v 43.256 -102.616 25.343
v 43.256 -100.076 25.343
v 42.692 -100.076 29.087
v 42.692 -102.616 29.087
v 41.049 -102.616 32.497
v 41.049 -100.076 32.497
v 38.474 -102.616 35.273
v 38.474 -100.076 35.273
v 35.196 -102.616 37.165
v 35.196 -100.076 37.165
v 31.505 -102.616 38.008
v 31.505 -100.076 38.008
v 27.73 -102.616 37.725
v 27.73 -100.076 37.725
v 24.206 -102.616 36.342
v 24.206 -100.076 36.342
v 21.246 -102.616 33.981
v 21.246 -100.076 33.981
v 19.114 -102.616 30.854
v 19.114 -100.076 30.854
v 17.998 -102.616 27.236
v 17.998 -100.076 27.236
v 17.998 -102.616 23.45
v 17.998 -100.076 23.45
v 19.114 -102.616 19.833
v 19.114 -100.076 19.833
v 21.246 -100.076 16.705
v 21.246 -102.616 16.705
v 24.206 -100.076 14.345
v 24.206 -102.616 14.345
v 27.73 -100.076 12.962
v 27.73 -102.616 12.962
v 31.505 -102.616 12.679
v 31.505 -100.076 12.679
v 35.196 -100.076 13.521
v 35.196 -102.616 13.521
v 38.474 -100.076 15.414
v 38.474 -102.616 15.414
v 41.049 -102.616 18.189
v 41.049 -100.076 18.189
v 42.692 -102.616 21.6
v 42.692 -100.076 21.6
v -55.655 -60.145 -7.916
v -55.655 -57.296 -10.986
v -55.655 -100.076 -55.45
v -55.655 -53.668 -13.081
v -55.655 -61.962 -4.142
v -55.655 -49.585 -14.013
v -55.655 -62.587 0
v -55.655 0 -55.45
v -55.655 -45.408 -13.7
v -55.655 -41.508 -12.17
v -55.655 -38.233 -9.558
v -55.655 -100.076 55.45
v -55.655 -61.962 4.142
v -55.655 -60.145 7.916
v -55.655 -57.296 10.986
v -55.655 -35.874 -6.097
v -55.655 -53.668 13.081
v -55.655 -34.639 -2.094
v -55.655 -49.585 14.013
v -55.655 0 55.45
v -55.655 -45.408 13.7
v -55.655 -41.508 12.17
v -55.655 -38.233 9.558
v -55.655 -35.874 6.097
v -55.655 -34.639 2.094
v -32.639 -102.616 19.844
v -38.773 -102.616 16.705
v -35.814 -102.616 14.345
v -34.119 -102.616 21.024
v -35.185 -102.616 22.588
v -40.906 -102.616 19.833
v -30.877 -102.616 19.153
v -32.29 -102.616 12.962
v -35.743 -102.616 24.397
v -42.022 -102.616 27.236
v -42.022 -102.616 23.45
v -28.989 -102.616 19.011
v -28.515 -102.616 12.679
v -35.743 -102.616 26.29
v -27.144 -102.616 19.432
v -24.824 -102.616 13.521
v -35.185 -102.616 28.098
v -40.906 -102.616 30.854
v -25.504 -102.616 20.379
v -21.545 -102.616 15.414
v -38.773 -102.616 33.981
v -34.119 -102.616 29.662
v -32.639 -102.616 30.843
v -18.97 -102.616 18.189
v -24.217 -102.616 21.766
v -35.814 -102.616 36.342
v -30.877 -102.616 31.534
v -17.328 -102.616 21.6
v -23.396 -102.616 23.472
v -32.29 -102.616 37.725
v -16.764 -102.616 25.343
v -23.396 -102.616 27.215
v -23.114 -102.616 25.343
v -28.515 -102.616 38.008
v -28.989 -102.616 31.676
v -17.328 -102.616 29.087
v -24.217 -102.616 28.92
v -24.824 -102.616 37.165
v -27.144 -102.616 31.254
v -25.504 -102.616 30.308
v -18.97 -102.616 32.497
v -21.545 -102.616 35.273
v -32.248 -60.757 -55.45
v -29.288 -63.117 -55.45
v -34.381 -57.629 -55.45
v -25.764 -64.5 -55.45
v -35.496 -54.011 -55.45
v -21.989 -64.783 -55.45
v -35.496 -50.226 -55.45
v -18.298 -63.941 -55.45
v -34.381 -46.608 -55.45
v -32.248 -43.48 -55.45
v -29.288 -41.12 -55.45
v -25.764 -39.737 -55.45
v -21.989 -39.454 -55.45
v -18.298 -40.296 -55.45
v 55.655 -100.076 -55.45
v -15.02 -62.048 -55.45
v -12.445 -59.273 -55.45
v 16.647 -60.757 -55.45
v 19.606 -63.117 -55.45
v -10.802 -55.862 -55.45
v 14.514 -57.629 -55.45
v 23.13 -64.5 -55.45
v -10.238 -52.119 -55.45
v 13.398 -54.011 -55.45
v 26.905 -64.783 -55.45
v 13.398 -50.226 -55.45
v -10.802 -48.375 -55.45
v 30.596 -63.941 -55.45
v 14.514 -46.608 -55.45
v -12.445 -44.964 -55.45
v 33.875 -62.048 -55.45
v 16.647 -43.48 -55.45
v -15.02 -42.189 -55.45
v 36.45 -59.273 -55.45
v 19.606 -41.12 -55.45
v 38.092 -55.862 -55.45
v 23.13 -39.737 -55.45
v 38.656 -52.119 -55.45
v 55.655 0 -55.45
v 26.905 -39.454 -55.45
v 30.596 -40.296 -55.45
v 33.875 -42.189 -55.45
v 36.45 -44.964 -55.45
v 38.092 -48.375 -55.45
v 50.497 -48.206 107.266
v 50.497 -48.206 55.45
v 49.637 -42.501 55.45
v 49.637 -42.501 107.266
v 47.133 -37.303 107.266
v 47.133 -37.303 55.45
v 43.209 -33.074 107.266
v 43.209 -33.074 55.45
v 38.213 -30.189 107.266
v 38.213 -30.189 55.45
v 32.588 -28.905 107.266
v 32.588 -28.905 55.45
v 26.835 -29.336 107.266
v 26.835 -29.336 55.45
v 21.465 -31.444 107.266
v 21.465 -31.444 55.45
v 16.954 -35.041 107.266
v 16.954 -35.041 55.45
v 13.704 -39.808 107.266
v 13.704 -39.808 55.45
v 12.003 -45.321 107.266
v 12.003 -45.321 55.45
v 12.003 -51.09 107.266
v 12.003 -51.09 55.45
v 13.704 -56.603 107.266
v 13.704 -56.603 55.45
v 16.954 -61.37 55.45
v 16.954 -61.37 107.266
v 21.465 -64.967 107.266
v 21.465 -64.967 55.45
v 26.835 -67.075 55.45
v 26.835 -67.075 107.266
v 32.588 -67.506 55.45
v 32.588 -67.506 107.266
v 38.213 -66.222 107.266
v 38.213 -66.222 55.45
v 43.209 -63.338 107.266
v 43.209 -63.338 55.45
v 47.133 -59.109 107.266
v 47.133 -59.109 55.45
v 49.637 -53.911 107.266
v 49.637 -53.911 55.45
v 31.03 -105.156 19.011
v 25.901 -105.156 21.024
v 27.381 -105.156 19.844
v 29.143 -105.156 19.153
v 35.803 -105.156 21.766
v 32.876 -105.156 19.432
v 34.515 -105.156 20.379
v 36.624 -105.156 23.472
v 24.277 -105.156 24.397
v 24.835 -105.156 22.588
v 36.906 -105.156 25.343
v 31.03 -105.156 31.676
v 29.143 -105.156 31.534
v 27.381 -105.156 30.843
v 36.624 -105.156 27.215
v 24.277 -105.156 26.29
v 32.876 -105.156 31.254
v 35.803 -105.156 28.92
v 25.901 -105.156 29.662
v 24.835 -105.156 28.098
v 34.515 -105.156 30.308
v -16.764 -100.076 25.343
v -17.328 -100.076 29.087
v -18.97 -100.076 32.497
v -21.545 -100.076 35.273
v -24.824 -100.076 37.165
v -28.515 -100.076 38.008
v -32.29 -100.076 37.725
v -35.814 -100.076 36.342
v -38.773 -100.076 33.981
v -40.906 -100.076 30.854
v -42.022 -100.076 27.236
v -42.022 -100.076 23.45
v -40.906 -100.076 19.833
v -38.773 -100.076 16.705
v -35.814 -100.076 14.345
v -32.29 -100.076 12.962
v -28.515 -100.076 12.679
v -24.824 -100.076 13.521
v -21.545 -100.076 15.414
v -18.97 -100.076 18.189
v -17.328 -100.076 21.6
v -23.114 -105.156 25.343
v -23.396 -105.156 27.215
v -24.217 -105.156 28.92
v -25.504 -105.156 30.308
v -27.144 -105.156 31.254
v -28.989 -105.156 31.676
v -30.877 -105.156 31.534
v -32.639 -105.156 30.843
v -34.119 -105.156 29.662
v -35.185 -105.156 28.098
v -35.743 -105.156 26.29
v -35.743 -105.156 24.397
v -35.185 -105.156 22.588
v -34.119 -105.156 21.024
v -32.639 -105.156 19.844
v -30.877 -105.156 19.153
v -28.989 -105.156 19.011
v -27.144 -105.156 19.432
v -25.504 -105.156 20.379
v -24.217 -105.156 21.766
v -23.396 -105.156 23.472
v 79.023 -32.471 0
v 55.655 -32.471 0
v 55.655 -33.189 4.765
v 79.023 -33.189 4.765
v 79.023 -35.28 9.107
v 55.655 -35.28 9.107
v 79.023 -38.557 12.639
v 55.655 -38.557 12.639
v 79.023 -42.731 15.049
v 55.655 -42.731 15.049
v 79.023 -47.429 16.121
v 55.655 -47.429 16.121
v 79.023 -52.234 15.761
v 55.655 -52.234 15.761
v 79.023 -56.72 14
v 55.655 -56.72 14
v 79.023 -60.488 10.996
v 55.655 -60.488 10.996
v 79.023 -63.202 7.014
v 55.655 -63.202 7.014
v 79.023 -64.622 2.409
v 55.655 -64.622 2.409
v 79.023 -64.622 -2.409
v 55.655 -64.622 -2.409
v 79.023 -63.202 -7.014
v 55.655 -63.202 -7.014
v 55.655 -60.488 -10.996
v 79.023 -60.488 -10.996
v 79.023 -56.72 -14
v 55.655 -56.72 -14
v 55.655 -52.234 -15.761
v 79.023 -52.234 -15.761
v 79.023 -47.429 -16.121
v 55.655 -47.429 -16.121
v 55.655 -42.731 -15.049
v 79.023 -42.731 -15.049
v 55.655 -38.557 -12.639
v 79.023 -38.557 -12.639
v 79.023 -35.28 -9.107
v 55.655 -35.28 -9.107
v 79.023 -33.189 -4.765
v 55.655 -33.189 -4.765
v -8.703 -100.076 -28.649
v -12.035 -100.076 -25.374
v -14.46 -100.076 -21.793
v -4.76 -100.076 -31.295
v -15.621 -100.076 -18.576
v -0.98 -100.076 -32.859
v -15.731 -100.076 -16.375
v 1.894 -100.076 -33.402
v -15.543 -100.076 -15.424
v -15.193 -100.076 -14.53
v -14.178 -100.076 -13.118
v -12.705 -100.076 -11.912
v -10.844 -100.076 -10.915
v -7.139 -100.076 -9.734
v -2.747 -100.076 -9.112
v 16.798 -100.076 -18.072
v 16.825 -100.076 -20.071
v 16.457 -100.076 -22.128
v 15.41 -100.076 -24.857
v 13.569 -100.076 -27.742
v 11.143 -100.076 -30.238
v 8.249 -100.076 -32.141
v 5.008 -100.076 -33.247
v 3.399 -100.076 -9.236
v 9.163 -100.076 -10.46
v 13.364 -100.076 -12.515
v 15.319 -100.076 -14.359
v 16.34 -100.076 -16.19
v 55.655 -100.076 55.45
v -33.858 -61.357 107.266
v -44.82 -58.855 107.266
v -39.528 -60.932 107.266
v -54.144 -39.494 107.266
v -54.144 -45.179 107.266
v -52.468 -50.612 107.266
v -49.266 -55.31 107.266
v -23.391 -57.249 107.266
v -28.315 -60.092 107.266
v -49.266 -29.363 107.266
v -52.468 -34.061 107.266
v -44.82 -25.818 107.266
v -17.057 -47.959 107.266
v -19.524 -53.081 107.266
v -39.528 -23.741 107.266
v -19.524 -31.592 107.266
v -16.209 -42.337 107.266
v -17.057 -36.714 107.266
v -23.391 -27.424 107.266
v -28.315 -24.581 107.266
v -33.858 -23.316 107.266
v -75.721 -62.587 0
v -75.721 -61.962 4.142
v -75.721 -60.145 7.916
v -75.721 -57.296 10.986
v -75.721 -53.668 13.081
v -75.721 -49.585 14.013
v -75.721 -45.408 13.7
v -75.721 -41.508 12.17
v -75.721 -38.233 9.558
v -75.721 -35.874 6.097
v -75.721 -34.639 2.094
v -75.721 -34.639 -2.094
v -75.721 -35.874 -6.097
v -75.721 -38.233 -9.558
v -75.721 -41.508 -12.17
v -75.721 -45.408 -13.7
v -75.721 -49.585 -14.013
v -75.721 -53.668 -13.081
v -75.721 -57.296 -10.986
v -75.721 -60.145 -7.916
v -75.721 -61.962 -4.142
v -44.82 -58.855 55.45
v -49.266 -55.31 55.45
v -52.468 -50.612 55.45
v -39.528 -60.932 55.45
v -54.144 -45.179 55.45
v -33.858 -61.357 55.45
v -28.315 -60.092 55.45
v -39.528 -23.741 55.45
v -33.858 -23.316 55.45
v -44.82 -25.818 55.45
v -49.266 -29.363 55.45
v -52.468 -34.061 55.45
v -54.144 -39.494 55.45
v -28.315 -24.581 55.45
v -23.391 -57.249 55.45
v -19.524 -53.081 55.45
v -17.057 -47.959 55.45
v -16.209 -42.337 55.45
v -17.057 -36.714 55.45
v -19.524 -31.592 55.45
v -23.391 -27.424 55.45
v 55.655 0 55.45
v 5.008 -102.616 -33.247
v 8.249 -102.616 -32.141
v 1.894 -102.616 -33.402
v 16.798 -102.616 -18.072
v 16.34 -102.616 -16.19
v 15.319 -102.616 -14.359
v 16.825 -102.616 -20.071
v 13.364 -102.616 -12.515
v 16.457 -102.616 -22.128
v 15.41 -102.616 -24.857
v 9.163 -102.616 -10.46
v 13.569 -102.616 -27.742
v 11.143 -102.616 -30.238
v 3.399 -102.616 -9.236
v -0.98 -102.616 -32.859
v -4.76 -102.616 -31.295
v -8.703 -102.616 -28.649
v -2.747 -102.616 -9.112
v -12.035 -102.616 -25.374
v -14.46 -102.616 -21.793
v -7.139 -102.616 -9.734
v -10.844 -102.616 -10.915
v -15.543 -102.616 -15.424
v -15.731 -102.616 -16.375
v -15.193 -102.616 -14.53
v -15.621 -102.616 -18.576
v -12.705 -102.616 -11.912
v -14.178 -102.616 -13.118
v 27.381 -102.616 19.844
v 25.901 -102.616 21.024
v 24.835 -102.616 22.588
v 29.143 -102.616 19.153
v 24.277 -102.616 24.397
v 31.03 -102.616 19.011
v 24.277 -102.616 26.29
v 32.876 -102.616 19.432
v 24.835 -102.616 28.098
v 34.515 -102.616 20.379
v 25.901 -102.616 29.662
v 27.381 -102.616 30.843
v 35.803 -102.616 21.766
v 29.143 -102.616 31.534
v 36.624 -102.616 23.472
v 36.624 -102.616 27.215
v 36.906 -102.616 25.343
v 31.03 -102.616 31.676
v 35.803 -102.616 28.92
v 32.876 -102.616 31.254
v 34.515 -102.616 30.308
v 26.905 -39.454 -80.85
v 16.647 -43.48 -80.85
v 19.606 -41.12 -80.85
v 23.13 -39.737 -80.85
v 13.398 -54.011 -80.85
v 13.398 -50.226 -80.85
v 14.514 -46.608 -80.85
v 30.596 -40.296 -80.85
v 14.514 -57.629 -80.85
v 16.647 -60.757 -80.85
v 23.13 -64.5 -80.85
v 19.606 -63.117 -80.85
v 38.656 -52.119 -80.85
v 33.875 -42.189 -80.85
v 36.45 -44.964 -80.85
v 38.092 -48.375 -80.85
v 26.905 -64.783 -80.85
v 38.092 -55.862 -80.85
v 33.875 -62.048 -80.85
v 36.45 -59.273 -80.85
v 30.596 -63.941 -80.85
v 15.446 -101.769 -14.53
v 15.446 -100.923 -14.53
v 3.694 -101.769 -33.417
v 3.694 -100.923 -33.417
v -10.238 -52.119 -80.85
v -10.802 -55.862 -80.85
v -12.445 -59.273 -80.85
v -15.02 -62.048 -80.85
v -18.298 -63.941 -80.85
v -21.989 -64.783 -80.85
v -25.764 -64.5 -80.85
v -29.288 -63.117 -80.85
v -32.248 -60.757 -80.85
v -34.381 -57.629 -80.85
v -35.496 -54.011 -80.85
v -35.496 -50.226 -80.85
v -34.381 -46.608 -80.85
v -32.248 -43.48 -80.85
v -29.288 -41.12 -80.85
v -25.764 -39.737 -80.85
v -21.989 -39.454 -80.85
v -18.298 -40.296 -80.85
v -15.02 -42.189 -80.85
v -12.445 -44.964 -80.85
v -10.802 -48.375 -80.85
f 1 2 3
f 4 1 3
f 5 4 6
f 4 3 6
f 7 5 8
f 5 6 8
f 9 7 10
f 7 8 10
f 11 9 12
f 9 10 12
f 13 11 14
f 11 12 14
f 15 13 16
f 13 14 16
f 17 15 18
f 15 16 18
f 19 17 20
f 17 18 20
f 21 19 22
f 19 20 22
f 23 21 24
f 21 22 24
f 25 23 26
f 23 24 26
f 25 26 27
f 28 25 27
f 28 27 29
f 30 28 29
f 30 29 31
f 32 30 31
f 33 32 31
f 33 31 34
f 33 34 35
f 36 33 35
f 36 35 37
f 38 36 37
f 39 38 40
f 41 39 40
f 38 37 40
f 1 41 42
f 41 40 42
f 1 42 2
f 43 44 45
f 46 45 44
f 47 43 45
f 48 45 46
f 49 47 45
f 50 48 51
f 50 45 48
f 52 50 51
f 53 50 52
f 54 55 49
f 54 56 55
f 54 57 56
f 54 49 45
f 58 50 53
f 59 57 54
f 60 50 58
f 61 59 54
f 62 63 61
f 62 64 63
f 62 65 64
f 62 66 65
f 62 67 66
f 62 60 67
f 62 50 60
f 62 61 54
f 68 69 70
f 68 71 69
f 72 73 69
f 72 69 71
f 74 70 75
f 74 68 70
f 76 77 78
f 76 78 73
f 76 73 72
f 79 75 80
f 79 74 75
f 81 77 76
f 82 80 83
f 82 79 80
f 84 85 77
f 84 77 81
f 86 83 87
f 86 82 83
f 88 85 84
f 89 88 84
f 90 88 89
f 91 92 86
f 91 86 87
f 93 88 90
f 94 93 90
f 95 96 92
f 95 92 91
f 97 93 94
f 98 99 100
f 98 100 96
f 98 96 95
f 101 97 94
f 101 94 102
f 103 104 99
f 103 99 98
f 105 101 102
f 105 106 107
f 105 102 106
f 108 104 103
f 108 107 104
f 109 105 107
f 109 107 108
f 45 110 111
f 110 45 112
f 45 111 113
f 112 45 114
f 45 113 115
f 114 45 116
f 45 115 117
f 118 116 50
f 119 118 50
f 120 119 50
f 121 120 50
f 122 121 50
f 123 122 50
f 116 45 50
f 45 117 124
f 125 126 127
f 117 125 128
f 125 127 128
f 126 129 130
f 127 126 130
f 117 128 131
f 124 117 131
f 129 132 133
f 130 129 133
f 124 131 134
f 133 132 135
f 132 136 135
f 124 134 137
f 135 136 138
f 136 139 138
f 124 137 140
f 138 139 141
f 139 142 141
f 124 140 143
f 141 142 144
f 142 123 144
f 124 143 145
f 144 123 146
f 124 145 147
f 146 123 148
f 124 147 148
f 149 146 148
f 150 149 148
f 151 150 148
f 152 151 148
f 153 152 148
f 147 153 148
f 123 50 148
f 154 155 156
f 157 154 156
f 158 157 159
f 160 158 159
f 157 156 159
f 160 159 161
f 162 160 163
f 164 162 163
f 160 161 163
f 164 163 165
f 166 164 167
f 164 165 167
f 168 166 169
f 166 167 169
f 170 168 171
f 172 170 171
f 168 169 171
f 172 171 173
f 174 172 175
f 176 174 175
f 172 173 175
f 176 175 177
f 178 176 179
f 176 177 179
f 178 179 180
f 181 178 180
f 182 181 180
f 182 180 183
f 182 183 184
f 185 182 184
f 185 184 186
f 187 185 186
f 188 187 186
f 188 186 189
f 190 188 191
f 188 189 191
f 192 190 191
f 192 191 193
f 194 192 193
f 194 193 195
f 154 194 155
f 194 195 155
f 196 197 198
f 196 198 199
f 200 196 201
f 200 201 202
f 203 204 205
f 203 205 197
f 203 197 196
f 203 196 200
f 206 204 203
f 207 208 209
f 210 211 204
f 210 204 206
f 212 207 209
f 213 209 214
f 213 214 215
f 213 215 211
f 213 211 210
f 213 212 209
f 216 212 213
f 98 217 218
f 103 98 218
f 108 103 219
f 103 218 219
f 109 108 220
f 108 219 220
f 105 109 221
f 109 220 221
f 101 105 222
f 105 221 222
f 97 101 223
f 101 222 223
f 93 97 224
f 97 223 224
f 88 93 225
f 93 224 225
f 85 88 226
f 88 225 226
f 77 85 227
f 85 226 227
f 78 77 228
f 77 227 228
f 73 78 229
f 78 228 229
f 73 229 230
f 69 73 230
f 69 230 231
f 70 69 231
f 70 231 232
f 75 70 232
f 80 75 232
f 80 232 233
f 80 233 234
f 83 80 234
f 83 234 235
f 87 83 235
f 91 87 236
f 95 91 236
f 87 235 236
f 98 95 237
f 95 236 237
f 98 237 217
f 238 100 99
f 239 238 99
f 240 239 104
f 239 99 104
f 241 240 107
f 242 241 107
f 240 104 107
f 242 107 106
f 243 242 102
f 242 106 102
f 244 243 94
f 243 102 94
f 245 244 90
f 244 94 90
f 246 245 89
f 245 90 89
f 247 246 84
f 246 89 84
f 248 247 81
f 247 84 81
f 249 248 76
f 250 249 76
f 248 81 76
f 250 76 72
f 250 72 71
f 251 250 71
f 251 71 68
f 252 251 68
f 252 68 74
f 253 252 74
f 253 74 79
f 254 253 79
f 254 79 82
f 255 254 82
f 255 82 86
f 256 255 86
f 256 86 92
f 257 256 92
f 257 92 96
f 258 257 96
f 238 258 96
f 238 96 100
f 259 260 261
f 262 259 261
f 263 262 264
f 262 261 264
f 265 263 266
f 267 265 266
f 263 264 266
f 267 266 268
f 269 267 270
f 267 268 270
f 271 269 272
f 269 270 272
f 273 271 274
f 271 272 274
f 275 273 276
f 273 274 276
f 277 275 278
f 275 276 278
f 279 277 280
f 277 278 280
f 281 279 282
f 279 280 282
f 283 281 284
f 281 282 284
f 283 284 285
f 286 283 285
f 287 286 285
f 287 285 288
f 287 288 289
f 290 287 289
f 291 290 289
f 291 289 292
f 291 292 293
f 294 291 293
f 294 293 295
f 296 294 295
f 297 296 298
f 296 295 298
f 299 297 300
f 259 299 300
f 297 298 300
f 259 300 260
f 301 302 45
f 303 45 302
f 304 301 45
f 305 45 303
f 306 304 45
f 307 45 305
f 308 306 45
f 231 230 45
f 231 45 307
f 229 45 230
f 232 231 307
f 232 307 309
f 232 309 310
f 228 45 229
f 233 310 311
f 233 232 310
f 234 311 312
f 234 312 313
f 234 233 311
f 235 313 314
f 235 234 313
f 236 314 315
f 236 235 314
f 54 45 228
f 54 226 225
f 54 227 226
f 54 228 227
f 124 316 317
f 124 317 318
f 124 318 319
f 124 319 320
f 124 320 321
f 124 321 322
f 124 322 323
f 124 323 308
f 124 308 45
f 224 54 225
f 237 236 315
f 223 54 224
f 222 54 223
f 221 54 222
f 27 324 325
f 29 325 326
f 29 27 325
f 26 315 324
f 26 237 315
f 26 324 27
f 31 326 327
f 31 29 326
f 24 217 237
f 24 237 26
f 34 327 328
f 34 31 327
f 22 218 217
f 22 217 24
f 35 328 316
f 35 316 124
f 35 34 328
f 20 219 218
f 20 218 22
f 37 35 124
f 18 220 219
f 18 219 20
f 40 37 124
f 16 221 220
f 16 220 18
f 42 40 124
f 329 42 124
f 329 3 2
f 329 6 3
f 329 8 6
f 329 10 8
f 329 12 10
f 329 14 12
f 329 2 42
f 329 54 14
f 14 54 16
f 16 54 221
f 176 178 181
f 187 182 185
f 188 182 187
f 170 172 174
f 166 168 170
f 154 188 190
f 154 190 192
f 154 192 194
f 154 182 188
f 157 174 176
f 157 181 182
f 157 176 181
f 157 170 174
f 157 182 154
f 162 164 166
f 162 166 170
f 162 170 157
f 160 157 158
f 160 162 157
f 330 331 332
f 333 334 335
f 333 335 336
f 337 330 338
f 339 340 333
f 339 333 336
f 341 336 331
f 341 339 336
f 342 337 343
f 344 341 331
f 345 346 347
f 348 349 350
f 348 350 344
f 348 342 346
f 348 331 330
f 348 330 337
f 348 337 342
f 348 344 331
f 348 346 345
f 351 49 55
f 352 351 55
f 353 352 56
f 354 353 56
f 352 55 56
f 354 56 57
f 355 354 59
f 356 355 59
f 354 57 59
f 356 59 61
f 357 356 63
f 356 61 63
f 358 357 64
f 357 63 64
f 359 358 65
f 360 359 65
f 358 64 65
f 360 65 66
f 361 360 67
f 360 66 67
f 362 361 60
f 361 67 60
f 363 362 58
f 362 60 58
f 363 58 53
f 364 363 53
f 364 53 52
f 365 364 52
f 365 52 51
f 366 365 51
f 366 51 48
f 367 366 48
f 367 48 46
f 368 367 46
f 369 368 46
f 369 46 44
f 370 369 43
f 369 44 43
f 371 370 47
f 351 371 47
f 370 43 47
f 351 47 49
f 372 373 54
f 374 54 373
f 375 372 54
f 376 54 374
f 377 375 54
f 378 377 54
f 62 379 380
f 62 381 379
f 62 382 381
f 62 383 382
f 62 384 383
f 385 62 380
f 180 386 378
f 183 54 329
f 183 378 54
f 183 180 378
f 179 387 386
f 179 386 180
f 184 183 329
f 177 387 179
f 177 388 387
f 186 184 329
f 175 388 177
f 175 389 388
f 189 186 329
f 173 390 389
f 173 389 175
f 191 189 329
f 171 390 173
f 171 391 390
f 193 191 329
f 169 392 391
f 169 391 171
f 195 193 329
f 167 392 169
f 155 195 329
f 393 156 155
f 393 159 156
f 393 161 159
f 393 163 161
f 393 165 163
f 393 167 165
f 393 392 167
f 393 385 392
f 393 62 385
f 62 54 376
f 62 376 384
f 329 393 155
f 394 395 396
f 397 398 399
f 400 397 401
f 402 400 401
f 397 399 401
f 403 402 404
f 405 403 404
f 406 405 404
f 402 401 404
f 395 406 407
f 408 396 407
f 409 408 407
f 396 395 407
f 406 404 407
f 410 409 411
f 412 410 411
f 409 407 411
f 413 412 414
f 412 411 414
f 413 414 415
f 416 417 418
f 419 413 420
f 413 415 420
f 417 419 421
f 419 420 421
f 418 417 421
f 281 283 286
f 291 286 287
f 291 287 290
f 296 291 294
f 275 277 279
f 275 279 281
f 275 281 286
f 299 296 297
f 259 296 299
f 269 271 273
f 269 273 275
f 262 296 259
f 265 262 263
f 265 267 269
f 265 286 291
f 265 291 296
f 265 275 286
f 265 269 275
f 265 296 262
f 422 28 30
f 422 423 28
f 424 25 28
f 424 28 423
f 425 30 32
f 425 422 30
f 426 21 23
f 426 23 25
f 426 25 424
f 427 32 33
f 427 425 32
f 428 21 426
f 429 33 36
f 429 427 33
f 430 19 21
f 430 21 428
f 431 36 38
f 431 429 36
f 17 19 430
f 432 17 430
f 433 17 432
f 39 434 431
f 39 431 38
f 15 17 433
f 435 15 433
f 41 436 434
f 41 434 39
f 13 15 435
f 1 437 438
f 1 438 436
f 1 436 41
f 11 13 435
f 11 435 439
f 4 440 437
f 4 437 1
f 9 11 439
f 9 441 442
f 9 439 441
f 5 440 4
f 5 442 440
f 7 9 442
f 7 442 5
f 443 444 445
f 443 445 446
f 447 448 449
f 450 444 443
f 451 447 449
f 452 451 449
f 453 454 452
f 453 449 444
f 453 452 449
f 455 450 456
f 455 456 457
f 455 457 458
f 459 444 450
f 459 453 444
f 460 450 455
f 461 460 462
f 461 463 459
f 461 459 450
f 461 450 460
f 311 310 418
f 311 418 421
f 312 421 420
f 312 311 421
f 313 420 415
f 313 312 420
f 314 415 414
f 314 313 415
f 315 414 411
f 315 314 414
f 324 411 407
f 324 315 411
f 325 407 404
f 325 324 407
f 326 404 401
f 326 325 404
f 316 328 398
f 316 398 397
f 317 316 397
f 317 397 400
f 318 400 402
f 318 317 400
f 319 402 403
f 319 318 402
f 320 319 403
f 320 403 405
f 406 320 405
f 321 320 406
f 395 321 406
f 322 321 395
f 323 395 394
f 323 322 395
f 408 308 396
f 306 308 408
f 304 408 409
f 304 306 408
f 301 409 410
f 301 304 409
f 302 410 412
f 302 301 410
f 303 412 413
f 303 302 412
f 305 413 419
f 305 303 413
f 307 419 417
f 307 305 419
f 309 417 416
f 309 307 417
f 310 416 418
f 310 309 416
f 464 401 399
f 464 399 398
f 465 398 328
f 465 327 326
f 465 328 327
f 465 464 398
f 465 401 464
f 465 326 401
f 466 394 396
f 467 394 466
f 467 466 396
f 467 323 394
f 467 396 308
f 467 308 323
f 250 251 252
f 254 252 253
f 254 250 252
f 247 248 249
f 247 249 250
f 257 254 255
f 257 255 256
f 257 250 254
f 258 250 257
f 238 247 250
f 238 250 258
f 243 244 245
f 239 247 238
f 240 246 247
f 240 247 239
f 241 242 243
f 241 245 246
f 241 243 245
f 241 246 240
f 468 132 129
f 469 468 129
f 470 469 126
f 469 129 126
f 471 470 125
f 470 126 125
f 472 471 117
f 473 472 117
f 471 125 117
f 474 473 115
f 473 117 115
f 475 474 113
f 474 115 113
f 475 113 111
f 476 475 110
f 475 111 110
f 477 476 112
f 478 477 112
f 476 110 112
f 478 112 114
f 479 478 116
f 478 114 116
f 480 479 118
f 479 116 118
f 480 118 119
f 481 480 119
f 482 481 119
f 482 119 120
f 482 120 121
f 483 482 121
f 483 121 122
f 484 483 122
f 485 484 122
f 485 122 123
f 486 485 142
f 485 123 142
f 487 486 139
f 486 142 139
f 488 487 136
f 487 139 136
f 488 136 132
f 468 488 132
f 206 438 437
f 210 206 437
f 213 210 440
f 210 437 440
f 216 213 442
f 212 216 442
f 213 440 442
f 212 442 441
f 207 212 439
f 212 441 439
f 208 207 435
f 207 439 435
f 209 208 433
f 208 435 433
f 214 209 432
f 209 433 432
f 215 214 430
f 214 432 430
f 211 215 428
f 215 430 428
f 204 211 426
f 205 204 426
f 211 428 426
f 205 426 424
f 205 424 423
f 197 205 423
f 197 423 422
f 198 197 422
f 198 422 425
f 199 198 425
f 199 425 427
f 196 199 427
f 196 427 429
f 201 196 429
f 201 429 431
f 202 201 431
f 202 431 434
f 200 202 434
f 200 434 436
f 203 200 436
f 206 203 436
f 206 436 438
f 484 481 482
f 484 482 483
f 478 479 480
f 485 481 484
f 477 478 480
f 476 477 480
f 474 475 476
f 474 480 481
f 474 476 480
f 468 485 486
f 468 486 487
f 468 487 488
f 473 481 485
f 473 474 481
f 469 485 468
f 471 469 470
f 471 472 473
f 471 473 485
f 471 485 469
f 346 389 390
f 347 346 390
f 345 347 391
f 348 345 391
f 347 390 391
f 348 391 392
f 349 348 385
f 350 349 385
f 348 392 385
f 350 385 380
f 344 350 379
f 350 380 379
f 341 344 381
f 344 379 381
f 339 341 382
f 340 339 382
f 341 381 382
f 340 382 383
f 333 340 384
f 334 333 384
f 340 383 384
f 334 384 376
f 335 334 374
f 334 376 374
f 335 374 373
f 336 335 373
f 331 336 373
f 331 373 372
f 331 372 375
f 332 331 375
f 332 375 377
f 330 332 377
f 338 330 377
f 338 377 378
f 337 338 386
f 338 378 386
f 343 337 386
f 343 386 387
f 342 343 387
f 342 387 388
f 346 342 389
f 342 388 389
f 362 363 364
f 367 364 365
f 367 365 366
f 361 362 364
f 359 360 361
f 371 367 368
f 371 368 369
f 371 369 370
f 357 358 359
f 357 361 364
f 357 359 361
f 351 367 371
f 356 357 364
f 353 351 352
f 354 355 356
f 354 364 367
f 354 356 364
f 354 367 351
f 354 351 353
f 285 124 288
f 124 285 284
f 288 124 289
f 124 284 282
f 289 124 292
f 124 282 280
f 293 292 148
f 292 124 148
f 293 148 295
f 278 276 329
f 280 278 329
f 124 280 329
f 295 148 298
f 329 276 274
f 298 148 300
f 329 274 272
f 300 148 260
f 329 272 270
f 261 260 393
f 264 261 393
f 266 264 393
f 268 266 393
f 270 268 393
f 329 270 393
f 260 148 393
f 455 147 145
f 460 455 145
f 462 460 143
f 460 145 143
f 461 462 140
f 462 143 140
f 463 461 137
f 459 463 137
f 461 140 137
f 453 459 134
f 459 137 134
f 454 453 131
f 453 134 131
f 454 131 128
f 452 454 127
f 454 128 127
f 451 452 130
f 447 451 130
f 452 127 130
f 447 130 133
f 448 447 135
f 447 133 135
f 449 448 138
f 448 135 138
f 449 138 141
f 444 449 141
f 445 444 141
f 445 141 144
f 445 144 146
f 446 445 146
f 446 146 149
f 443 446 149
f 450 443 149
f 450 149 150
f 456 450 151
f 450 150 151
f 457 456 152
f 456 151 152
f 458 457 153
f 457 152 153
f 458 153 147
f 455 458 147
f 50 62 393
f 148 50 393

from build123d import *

# Parameters (mm, degrees)
F0_W      = 111.3092452288
F0_H      = 110.8992248774
F1_DEPTH  = 100.076
F2_R      = 19.073919737
F2_R_2    = 19.3546495163
F3_DEPTH  = 51.816
F4_R      = 12.7
F4_R_2    = 6.35
F5_DEPTH  = 2.54
F6_DEPTH  = 5.08
F8_DEPTH  = 2.54
F10_R     = 14.0521867963
F11_DEPTH = 20.066
F12_R     = 16.1662209707
F13_DEPTH = 23.368
F14_R     = 12.7
F15_DEPTH = 25.4


with BuildPart() as f1:
    # F0 (on Front) → F1 (new body)
    with BuildSketch(Plane.XZ):
        Rectangle(F0_W, F0_H)
    extrude(amount=F1_DEPTH)

    # F2 (on face) → F3 (join)
    with BuildSketch(Plane.XY.offset(55.4496124387)):
        with Locations((-35.2833792567, -42.3366203904)):
            Circle(F2_R)
        with Locations((31.1419349164, -48.2057631016)):
            Circle(F2_R_2)
    extrude(amount=F3_DEPTH)

    # F4 (on face) → F5 (join)
    with BuildSketch(Plane.XZ.offset(100.076)):
        with Locations((-29.463622719, 25.3433045)):
            Circle(F4_R)
        with Locations((-29.463622719, 25.3433045)):
            Circle(F4_R_2, mode=Mode.SUBTRACT)
        with Locations((30.5558927357, 25.3433045)):
            Circle(F4_R)
        with Locations((30.5558927357, 25.3433045)):
            Circle(F4_R_2, mode=Mode.SUBTRACT)
    extrude(amount=F5_DEPTH)

    # F6 (add): faces of the model
    f6_faces = [f1.faces().sort_by_distance(p)[0] for p in [
        (-29.463622719, -100.076, 25.3433045),
        (30.5558927357, -100.076, 25.3433045),
    ]]
    extrude(f6_faces, amount=F6_DEPTH)

    # F7 (on face) → F8 (join)
    with BuildSketch(Plane.XZ.offset(100.076)):
        with BuildLine():
            add(Edge.make_bspline(
                [(-15.1932500303, -14.5297981799), (-11.5570264912, -7.3093204863), (28.4939557063, -6.8955534703), (4.9116646059, -45.832072352), (-18.5883527484, -21.2714803619), (-15.1932500303, -14.5297981799)],
                knots=[0, 0, 0, 0, 0.3589682542, 0.6648352109, 1, 1, 1, 1], degree=3))
        make_face()
    extrude(amount=F8_DEPTH)

    # F10 (on face) → F11 (join)
    with BuildSketch(Plane(origin=(-55.6546226144, 0, 0), x_dir=(0, -1, 0), z_dir=(-1, 0, 0))):
        with Locations((48.5344566405, 0)):
            Circle(F10_R)
    extrude(amount=F11_DEPTH)

    # F12 (on face) → F13 (join)
    with BuildSketch(Plane.YZ.offset(55.6546226144)):
        with Locations((-48.6368350685, 0)):
            Circle(F12_R)
    extrude(amount=F13_DEPTH)

    # F14 (on face) → F15 (join)
    with BuildSketch(Plane(origin=(0, 0, -55.4496124387), x_dir=(1, 0, 0), z_dir=(0, 0, -1))):
        with Locations((-22.938253358, 52.1185323596)):
            Circle(F14_R)
        with Locations((25.9563419968, 52.1185323596)):
            Circle(F14_R)
    extrude(amount=F15_DEPTH)


solid = f1.part
